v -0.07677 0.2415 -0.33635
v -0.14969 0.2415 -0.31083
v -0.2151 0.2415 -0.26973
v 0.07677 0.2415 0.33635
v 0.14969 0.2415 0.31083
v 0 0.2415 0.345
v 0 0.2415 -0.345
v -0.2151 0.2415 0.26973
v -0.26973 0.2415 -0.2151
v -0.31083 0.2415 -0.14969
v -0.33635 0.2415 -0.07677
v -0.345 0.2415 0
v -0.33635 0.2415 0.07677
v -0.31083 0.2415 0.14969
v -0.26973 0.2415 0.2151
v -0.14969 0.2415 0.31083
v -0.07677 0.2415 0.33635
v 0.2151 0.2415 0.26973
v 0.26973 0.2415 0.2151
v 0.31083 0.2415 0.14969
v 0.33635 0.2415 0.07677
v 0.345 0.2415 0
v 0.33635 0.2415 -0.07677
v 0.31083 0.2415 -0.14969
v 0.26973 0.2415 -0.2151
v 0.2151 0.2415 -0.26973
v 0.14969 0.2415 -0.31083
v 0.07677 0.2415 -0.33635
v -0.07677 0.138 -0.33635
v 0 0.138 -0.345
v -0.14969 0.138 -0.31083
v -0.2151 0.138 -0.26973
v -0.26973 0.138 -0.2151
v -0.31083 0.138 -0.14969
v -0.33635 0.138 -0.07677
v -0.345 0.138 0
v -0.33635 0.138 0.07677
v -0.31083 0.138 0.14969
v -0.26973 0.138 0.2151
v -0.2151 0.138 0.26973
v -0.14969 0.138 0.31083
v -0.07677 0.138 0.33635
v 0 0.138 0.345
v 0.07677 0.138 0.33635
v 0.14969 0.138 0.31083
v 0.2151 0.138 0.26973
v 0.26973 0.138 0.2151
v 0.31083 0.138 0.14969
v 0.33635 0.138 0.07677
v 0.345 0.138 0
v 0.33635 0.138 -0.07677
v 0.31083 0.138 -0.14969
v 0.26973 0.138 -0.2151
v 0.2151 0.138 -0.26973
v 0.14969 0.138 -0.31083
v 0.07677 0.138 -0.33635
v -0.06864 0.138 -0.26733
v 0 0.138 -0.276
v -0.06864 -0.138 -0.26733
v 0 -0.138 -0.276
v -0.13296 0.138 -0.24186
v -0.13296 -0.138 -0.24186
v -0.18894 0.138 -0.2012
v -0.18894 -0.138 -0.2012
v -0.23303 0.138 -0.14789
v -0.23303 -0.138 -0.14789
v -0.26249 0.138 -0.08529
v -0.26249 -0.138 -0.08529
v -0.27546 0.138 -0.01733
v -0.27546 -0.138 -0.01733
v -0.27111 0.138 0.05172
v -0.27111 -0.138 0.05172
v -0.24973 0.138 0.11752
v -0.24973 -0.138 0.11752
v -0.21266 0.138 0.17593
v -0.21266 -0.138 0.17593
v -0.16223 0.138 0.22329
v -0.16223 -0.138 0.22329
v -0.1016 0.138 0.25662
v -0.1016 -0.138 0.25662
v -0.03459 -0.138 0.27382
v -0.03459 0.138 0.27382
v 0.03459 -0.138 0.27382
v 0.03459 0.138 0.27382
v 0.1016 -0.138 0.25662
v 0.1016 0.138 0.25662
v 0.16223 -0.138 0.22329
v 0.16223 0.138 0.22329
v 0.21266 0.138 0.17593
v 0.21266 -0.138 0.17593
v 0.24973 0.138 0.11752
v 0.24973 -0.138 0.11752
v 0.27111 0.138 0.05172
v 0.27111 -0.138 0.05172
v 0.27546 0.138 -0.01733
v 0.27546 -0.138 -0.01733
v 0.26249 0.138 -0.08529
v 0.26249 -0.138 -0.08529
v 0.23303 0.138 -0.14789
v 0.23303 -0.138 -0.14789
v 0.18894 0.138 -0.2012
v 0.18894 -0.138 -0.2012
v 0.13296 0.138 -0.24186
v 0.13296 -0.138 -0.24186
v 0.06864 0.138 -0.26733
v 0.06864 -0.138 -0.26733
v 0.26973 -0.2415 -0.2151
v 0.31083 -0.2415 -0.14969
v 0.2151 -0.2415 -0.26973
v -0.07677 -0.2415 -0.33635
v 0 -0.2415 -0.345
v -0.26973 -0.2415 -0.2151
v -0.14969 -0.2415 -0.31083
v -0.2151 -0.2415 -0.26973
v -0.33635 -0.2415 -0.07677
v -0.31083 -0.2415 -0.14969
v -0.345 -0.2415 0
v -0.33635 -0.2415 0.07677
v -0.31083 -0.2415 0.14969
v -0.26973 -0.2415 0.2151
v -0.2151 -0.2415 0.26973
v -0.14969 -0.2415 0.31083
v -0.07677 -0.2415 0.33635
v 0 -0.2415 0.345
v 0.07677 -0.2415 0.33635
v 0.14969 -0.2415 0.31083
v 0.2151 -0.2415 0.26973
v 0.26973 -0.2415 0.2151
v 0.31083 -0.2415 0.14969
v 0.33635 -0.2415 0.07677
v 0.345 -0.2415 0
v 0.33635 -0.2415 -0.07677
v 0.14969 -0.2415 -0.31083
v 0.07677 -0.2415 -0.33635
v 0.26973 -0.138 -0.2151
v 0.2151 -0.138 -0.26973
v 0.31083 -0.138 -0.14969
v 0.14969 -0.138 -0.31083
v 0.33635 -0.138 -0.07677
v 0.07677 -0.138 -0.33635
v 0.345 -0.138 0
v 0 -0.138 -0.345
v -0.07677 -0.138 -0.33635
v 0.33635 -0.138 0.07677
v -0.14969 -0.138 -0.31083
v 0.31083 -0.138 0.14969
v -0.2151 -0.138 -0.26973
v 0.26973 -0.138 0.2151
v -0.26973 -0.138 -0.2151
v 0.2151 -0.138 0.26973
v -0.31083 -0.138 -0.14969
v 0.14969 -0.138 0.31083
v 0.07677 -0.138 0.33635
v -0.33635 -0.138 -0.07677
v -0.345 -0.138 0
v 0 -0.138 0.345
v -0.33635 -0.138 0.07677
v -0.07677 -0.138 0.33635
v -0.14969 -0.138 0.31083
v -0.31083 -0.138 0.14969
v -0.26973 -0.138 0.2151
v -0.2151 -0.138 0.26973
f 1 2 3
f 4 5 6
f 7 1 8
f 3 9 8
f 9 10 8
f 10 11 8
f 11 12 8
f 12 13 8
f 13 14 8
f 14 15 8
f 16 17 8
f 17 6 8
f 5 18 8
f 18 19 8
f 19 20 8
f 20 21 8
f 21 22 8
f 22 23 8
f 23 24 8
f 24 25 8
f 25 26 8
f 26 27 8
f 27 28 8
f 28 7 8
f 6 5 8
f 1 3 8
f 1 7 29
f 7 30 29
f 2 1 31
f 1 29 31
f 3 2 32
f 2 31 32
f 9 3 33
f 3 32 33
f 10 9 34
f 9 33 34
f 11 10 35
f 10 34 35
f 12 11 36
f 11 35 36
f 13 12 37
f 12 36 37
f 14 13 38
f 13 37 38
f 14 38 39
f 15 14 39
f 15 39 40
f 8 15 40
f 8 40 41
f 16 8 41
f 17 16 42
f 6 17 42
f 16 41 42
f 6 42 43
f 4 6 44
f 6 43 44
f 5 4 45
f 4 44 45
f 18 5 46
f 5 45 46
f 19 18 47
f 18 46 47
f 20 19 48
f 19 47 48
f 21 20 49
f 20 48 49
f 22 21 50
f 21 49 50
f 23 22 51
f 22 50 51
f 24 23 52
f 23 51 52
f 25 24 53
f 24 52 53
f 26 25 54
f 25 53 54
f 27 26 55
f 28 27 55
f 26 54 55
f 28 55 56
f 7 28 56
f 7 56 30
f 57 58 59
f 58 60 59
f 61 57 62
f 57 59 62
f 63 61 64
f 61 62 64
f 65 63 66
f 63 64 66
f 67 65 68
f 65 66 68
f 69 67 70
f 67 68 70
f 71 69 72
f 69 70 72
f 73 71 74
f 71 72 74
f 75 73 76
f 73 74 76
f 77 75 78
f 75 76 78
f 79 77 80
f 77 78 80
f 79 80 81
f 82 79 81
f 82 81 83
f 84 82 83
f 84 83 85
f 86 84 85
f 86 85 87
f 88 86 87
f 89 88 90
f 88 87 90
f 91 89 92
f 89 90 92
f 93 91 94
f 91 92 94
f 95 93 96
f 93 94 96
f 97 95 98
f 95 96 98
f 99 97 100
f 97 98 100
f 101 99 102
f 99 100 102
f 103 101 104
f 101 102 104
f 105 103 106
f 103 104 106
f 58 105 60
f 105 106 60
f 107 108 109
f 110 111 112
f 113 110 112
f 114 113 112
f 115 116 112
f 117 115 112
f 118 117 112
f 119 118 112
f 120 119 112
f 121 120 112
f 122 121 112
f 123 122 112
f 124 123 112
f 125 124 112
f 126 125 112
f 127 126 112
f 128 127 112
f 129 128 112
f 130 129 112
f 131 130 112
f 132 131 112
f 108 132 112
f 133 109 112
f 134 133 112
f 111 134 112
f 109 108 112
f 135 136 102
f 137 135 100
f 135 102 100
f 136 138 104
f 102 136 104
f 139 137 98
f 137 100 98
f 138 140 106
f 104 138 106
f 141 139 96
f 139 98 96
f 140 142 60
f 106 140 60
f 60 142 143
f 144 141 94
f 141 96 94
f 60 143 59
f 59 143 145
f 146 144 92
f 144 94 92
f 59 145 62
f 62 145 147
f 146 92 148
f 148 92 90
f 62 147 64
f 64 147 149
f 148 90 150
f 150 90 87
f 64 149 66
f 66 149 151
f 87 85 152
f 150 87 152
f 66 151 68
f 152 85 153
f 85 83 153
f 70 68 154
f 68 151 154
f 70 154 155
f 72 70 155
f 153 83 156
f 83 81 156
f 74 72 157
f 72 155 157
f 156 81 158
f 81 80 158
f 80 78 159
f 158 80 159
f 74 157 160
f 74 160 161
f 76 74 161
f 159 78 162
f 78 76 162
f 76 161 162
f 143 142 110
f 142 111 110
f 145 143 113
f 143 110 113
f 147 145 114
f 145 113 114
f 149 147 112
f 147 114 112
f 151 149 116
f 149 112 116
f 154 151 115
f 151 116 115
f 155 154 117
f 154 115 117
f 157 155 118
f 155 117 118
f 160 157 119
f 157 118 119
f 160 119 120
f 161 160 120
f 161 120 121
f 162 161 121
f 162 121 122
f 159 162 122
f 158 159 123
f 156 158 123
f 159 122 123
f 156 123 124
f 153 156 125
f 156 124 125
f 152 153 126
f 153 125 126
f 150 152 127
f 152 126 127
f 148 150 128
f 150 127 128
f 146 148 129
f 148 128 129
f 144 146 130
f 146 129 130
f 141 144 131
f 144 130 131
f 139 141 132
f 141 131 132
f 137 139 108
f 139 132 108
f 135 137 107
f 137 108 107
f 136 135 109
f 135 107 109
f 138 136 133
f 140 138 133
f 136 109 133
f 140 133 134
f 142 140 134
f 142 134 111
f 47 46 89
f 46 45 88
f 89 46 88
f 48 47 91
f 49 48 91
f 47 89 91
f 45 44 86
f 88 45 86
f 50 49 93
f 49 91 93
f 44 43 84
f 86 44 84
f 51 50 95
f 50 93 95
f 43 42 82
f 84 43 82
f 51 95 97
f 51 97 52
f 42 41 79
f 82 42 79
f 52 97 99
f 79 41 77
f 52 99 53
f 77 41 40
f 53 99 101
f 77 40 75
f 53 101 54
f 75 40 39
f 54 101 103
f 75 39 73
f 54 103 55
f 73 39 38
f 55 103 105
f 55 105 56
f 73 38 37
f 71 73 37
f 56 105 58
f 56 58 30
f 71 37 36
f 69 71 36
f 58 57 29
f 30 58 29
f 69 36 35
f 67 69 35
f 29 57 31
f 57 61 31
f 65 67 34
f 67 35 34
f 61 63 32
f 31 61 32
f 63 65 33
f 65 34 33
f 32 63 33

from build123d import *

# Parameters (mm, degrees)
ECHELLE1_SCALE = 0.69


with BuildPart() as part:
    # Esquisse1 → Révolution1 (revolve)
    with BuildSketch(Plane.XY, mode=Mode.PRIVATE) as r_volution1_sk:
        Polygon((0, -0.35), (0, 0.35), (0.5, 0.35), (0.5, 0.2), (0.4, 0.2), (0.4, -0.2), (0.5, -0.2), (0.5, -0.35), align=None)
    revolve(r_volution1_sk.sketch.rotate(Axis((0, -0.35, 0), (0, 1, 0)), 90), axis=Axis((0, -0.35, 0), (0, 1, 0)))


with BuildPart() as part_1:
    # Echelle1: scaled about (0, 0, 0)
    add(part.part.scale(ECHELLE1_SCALE))


solid = part_1.part
